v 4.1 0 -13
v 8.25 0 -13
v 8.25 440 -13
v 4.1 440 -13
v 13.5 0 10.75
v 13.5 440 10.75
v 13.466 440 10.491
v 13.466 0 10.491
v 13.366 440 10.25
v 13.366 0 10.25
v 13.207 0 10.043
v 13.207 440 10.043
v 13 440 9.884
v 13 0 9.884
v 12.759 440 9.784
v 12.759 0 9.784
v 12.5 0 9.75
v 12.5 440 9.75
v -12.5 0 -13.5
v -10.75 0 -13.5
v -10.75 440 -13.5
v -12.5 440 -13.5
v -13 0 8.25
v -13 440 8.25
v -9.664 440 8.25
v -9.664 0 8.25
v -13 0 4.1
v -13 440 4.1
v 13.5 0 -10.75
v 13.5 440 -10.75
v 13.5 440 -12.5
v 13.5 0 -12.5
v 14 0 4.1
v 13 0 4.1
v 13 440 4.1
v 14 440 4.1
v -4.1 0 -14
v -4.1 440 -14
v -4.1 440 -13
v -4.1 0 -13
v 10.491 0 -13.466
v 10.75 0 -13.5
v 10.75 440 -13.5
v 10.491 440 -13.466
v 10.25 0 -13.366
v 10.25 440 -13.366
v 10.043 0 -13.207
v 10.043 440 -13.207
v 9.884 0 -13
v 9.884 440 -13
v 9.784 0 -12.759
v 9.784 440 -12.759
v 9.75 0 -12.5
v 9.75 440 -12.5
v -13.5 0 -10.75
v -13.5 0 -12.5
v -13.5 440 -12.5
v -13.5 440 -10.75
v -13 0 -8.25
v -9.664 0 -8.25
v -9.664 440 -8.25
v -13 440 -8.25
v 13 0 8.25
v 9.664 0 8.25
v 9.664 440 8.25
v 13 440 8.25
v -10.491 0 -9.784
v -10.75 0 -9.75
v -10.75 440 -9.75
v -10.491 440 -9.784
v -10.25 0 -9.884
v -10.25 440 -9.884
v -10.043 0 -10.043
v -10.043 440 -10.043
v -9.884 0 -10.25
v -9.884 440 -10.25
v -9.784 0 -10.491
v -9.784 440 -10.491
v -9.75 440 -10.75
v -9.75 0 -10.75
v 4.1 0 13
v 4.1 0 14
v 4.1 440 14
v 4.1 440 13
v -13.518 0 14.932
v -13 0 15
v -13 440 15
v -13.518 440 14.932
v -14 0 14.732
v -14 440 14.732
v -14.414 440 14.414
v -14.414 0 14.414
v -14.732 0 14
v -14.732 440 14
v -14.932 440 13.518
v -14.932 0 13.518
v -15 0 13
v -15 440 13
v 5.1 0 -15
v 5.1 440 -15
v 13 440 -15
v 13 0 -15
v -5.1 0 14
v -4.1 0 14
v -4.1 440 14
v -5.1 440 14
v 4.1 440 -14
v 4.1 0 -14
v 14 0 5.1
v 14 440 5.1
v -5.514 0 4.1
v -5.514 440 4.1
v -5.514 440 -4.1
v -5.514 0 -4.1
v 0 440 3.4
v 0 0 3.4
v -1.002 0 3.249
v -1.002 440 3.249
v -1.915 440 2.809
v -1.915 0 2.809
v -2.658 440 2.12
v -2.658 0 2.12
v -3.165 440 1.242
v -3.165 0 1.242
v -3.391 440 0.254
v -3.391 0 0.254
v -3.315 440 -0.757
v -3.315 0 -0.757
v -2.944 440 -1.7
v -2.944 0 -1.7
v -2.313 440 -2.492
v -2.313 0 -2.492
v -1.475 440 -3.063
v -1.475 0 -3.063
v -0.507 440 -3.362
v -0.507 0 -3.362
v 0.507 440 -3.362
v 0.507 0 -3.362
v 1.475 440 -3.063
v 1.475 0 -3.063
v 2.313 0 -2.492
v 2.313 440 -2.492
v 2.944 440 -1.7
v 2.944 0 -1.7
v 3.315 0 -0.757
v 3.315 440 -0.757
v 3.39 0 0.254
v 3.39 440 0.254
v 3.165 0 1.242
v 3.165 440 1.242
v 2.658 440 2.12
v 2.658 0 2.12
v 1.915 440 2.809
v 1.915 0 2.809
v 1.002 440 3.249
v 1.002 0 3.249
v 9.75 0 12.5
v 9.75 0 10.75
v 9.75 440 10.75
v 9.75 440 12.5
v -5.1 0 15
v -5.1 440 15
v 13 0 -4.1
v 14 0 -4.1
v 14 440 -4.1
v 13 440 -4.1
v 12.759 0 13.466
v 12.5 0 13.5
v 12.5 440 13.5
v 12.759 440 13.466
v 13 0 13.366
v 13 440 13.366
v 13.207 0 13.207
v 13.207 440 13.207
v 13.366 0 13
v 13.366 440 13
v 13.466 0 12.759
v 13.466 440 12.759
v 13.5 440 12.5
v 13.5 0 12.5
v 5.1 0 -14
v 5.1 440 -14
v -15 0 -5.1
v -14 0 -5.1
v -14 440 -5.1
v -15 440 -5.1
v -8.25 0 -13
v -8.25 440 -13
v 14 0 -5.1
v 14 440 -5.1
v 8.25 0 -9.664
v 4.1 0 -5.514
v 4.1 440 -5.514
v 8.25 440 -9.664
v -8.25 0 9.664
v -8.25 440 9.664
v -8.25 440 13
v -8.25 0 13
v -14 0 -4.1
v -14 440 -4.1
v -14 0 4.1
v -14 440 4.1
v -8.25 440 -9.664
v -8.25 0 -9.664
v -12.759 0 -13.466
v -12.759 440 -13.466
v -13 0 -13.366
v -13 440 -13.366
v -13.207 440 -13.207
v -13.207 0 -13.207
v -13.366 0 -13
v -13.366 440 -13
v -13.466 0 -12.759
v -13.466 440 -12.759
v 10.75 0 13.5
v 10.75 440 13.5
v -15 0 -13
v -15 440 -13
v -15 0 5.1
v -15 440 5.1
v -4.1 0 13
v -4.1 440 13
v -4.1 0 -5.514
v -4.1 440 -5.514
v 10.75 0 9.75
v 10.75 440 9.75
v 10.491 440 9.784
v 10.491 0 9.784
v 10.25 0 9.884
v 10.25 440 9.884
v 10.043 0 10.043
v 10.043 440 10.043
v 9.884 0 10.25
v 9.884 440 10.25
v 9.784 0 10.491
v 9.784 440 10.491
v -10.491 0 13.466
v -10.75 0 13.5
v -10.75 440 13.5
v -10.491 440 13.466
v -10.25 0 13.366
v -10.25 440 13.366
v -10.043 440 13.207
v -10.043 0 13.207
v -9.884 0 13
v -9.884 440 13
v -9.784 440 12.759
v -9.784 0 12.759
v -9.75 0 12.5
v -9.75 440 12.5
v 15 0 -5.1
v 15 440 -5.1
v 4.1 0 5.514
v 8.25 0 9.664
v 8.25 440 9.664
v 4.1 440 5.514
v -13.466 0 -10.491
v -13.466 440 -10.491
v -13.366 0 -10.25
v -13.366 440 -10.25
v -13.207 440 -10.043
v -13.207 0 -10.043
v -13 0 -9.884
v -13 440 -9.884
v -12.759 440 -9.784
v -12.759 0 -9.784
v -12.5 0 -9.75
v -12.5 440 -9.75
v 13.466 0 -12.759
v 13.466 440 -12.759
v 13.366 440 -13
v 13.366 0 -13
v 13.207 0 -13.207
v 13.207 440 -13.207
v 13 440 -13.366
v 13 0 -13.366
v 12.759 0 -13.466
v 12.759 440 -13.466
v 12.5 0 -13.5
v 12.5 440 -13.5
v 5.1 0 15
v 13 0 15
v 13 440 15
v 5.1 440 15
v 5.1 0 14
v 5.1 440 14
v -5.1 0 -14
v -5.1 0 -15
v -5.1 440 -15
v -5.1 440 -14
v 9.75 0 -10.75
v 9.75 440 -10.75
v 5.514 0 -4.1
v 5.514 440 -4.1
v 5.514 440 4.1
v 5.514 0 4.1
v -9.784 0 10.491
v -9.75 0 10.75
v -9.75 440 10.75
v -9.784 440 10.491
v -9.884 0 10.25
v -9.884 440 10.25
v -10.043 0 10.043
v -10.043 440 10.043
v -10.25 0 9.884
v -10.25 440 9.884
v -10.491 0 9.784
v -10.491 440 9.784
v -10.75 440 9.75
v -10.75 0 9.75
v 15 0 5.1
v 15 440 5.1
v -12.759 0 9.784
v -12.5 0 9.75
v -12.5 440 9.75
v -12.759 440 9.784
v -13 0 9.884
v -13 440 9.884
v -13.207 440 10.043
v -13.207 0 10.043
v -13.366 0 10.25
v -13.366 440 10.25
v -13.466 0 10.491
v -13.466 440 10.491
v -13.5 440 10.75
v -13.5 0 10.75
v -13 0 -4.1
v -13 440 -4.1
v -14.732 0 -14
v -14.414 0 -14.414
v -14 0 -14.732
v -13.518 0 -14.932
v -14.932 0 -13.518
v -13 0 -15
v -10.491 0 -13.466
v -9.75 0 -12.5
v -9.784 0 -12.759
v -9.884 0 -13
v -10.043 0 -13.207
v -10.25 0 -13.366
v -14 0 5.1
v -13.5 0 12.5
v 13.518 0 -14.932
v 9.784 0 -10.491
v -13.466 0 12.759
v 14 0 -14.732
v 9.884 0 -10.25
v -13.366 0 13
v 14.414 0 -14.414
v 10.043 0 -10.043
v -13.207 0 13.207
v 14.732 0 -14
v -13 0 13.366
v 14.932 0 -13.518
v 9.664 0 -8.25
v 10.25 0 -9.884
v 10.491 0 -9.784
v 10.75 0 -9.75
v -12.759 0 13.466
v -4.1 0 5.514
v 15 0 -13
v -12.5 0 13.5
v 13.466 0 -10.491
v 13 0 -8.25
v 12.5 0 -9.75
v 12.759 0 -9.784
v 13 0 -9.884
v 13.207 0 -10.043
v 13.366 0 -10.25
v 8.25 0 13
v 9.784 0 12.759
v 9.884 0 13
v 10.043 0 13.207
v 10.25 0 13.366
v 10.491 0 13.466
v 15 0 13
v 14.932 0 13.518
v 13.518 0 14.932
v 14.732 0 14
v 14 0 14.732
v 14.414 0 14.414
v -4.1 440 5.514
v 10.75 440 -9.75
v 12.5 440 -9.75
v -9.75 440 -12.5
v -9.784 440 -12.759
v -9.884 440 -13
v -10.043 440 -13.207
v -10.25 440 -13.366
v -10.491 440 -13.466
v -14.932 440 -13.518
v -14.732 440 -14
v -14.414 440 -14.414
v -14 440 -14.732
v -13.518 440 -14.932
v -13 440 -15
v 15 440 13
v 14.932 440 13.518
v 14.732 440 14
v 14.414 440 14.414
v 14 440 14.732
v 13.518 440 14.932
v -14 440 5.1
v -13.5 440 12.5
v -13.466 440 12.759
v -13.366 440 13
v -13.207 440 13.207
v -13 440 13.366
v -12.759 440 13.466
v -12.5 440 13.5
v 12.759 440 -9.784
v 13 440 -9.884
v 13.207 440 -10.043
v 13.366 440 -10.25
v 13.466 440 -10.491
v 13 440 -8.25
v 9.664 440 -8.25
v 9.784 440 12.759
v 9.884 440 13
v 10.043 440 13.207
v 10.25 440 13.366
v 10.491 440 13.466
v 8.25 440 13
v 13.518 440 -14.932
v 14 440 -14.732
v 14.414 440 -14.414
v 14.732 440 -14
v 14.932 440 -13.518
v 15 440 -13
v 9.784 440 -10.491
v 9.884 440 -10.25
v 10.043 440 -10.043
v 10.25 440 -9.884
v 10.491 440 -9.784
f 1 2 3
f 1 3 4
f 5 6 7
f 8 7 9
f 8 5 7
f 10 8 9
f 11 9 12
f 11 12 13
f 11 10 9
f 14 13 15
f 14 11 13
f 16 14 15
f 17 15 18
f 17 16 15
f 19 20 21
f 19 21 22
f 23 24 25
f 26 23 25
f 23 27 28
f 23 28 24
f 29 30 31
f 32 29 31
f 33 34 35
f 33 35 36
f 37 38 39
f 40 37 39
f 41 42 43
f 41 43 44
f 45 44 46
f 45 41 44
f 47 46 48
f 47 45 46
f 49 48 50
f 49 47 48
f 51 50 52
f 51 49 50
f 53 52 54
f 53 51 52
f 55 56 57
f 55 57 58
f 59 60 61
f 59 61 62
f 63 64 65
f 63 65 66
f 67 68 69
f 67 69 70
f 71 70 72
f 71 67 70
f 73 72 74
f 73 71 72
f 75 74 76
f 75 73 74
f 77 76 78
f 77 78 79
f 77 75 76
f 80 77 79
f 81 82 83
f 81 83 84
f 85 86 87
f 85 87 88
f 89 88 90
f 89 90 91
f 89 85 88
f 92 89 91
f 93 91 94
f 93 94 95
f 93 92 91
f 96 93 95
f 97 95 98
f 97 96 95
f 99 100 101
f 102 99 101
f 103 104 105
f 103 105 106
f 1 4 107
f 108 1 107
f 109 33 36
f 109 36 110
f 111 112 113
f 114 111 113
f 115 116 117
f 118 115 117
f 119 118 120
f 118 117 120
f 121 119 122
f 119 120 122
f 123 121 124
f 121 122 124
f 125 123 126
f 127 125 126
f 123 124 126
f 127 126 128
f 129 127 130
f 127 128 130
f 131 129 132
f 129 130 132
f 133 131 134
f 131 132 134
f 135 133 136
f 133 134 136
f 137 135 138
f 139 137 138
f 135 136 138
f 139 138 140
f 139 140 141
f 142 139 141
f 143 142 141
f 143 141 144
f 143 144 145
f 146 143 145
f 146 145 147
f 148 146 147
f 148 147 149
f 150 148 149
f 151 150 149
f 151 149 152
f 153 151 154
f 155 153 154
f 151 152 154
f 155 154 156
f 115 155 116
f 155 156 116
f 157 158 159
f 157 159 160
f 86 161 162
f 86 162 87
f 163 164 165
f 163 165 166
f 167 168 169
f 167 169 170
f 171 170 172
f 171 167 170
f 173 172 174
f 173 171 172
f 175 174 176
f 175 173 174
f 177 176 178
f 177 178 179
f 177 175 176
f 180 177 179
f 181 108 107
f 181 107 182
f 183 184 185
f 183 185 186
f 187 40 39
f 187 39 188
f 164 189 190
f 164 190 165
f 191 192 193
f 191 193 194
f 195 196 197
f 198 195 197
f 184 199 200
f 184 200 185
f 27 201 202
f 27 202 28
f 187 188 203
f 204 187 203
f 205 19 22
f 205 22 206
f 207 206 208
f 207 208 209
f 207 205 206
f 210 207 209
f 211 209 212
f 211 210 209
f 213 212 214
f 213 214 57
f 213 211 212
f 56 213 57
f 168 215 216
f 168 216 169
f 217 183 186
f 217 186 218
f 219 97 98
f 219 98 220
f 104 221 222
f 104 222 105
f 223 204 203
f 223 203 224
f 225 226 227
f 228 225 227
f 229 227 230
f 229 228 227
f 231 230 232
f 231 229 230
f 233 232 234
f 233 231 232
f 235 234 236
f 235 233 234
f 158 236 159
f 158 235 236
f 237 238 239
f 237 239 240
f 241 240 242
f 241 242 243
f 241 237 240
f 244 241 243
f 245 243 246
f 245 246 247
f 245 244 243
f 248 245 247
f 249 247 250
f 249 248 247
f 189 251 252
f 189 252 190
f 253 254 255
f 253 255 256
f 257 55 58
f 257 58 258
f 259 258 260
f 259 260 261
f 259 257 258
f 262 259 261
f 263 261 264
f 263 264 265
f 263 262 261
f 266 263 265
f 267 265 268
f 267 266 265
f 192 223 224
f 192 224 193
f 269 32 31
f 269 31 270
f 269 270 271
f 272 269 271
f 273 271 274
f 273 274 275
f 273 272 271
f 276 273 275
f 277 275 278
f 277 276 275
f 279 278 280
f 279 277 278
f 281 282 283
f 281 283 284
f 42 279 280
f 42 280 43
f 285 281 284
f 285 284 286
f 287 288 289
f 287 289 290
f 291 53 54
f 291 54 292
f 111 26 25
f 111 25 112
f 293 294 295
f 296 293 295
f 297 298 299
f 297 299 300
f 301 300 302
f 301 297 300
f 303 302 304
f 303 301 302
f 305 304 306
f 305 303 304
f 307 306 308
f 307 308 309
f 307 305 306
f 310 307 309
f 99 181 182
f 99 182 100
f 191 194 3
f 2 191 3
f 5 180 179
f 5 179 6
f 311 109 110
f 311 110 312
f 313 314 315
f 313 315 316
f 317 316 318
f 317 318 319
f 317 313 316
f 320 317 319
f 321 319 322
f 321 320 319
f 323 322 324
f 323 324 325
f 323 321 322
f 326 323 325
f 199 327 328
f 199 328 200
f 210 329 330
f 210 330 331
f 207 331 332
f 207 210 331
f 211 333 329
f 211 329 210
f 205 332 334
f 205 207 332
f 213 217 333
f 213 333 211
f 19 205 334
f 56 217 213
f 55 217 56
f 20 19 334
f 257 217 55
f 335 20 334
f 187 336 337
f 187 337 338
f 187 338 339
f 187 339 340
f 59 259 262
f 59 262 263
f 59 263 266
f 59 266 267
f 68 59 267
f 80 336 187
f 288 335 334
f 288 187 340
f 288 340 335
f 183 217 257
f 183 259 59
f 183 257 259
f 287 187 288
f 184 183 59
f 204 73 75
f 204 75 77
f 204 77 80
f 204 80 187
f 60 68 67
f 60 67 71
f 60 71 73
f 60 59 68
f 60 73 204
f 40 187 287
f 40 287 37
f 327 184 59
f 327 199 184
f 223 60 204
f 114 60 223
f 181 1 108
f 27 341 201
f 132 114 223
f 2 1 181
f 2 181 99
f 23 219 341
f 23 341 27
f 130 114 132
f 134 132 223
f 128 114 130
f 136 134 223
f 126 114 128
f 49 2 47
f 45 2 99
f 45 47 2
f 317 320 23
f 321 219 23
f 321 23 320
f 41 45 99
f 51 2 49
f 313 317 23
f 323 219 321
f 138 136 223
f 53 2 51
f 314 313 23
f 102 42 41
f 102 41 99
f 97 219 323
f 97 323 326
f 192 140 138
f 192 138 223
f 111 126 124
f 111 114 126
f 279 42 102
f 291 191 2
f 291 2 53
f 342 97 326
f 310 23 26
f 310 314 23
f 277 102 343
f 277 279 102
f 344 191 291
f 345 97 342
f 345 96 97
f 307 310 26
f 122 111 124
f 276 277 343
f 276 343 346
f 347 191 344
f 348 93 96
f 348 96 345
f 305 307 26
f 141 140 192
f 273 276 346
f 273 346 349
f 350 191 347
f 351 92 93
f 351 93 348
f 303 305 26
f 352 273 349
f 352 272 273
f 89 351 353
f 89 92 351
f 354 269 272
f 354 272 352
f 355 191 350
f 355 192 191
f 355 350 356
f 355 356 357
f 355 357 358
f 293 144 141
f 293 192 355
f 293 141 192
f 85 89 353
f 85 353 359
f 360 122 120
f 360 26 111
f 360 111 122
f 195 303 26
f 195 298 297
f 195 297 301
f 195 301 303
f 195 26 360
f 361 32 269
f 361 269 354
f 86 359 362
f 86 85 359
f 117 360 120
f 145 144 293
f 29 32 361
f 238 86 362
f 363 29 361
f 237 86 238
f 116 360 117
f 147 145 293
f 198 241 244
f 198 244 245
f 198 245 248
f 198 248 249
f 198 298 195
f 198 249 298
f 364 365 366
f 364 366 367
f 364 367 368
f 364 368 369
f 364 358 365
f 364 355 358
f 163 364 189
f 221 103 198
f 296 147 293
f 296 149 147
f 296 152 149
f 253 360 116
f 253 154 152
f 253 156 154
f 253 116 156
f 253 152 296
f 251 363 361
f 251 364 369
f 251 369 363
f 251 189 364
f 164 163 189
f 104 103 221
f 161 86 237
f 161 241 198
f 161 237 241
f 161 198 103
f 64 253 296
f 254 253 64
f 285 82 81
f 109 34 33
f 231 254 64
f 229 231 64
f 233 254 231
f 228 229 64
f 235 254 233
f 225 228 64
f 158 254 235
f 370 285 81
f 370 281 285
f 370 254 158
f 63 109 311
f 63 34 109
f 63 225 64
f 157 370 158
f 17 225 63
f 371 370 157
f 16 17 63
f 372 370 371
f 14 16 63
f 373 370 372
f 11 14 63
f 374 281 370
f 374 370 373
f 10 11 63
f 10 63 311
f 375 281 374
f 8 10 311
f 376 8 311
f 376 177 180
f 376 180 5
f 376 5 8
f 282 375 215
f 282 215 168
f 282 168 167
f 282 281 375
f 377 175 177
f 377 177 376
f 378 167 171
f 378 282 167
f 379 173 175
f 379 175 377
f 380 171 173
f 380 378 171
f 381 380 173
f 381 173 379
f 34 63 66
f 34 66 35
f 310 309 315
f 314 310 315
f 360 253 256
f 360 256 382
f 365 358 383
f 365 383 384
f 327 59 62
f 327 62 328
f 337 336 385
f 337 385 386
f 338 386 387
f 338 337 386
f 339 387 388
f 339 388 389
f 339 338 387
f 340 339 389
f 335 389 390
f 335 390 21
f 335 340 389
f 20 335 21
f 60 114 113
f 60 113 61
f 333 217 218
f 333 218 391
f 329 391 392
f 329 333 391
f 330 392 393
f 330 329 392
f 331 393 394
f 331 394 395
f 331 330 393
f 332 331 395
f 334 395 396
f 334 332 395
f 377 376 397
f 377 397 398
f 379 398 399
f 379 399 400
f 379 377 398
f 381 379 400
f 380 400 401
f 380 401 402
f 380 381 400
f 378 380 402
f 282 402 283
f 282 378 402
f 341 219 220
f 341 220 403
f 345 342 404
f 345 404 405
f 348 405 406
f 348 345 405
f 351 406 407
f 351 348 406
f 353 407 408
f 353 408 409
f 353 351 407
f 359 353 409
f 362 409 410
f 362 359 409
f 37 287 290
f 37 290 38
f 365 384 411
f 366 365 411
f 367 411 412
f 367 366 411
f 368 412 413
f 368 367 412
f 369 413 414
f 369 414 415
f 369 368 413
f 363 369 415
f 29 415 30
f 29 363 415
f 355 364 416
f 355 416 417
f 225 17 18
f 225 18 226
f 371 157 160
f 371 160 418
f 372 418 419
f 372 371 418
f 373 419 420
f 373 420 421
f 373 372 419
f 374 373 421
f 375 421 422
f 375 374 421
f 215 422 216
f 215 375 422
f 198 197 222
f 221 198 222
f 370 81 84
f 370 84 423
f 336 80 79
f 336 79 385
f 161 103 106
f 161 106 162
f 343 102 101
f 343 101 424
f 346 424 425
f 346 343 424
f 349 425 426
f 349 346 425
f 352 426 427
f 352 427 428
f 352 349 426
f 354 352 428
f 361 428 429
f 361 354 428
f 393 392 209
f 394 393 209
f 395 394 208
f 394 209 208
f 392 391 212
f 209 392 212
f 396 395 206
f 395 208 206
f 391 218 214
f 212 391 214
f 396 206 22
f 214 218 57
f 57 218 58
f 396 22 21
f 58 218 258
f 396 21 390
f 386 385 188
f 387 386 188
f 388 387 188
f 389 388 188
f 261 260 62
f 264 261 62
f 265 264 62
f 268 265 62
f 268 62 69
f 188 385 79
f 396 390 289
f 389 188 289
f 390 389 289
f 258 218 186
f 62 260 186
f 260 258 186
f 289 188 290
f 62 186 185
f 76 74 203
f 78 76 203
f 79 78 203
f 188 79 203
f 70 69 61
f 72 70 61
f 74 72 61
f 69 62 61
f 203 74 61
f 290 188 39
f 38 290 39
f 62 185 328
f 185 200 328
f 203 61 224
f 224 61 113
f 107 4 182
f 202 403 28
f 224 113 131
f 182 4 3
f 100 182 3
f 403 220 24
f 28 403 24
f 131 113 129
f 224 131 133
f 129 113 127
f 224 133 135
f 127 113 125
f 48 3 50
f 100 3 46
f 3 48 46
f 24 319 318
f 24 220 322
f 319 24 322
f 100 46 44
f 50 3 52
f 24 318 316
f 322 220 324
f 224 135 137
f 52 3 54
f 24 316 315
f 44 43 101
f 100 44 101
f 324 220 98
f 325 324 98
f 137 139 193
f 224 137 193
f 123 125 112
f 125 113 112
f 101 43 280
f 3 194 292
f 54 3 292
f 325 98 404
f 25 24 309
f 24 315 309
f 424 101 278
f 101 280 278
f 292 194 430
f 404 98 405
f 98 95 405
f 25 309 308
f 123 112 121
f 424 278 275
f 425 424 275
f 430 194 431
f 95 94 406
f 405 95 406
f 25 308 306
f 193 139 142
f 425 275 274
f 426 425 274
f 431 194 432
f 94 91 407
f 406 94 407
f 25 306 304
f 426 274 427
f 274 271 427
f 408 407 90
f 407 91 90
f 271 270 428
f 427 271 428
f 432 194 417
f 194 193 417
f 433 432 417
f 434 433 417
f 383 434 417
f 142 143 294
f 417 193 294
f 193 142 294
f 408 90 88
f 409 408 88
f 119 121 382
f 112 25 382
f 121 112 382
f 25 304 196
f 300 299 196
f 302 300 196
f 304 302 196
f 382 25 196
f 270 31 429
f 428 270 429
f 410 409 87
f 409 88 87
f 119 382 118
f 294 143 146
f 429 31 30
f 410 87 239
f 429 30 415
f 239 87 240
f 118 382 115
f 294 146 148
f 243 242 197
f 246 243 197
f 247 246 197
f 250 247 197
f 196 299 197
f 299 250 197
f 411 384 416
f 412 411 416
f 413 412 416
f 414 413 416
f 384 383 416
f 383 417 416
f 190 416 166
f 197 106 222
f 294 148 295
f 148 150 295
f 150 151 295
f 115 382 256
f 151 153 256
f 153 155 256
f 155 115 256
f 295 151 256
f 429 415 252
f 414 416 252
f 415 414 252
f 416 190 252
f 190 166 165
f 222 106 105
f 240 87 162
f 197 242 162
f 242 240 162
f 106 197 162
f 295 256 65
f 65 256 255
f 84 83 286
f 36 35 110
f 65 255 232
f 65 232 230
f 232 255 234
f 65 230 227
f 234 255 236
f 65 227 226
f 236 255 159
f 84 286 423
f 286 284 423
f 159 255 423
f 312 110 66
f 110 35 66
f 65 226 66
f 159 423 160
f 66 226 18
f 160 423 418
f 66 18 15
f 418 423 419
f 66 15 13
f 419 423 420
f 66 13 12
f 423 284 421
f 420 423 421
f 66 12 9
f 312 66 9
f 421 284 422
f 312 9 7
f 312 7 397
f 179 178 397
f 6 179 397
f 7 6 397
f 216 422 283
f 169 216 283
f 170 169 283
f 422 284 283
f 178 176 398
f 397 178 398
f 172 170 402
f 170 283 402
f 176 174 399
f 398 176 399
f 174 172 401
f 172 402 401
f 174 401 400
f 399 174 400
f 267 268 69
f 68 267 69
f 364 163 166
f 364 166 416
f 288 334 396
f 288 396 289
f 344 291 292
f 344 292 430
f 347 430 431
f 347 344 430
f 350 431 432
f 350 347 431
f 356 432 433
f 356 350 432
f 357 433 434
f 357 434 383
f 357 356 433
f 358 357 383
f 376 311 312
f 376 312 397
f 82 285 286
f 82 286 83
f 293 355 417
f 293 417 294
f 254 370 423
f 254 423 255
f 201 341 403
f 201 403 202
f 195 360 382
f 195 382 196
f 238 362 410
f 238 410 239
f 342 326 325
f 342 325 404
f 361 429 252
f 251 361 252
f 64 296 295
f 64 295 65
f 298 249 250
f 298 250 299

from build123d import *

# Parameters (mm, degrees)
SKETCH1_R           = 3.4
BOSS_EXTRUDE1_DEPTH = 440


with BuildPart() as part:
    # Sketch1 → Boss-Extrude1 (new body)
    with BuildSketch(Plane.XZ):
        with BuildLine():
            Line((-8.24999678, 13.000000511), (-4.100001047, 13.000000511))
            Line((-4.100001047, 13.000000511), (-4.100001047, 13.9999993))
            Line((-4.100001047, 13.9999993), (-5.100001047, 13.9999993))
            Line((-5.100001047, 13.9999993), (-5.100001047, 15.000001161))
            Line((-5.100001047, 15.000001161), (-12.9999991, 15.000001161))
            ThreePointArc((-12.9999991, 15.000001161), (-14.414213082, 14.414214549), (-14.999999693, 13.000000567))
            Line((-14.999999693, 13.000000567), (-14.999999693, 5.099999792))
            Line((-14.999999693, 5.099999792), (-14.000001367, 5.099999792))
            Line((-14.000001367, 5.099999792), (-14.000001367, 4.099999792))
            Line((-14.000001367, 4.099999792), (-12.999980958, 4.099999792))
            Line((-12.999980958, 4.099999792), (-12.999980958, 8.250012005))
            Line((-12.999980958, 8.250012005), (-9.664201657, 8.250012005))
            Line((-9.664201657, 8.250012005), (-5.514202303, 4.100011174))
            Line((-5.514202303, 4.100011174), (-5.514202303, -4.099988826))
            Line((-5.514202303, -4.099988826), (-9.664194622, -8.249987936))
            Line((-9.664194622, -8.249987936), (-12.999980958, -8.249987936))
            Line((-12.999980958, -8.249987936), (-12.999980958, -4.100000208))
            Line((-12.999980958, -4.100000208), (-14.000001367, -4.100000208))
            Line((-14.000001367, -4.100000208), (-14.000001367, -5.100000208))
            Line((-14.000001367, -5.100000208), (-14.999999693, -5.100000208))
            Line((-14.999999693, -5.100000208), (-14.999999693, -13.000000955))
            ThreePointArc((-14.999999693, -13.000000955), (-14.414213128, -14.414214825), (-12.999999257, -15.000001391))
            Line((-12.999999257, -15.000001391), (-5.100001047, -15.000001391))
            Line((-5.100001047, -15.000001391), (-5.100001047, -14.000000699))
            Line((-5.100001047, -14.000000699), (-4.100001047, -14.000000699))
            Line((-4.100001047, -14.000000699), (-4.100001047, -13.000000927))
            Line((-4.100001047, -13.000000927), (-8.24999678, -13.000000927))
            Line((-8.24999678, -13.000000927), (-8.24999678, -9.664217294))
            Line((-8.24999678, -9.664217294), (-4.09999914, -5.514212907))
            Line((-4.09999914, -5.514212907), (4.100018356, -5.514212907))
            Line((4.100018356, -5.514212907), (8.250001062, -9.66419709))
            Line((8.250001062, -9.66419709), (8.250001062, -13.000000927))
            Line((8.250001062, -13.000000927), (4.099987439, -13.000000927))
            Line((4.099987439, -13.000000927), (4.099987439, -14.000000699))
            Line((4.099987439, -14.000000699), (5.099987459, -14.000000699))
            Line((5.099987459, -14.000000699), (5.099987459, -15.000001391))
            Line((5.099987459, -15.000001391), (12.999985682, -15.000001391))
            ThreePointArc((12.999985682, -15.000001391), (14.414199699, -14.414214765), (14.999986325, -13.000000748))
            Line((14.999986325, -13.000000748), (14.999986325, -5.100000208))
            Line((14.999986325, -5.100000208), (13.999990764, -5.100000208))
            Line((13.999990764, -5.100000208), (13.999990764, -4.100000208))
            Line((13.999990764, -4.100000208), (12.999996372, -4.100000208))
            Line((12.999996372, -4.100000208), (12.999996372, -8.249987936))
            Line((12.999996372, -8.249987936), (9.664201659, -8.249987936))
            Line((9.664201659, -8.249987936), (5.514206692, -4.099991492))
            Line((5.514206692, -4.099991492), (5.514206692, 4.100008559))
            Line((5.514206692, 4.100008559), (9.66420339, 8.250012005))
            Line((9.66420339, 8.250012005), (12.999996372, 8.250012005))
            Line((12.999996372, 8.250012005), (12.999996372, 4.099999792))
            Line((12.999996372, 4.099999792), (13.999990764, 4.099999792))
            Line((13.999990764, 4.099999792), (13.999990764, 5.099999792))
            Line((13.999990764, 5.099999792), (14.999986325, 5.099999792))
            Line((14.999986325, 5.099999792), (14.999986325, 13.000001058))
            ThreePointArc((14.999986325, 13.000001058), (14.414199857, 14.414214693), (12.999986222, 15.000001161))
            Line((12.999986222, 15.000001161), (5.099987459, 15.000001161))
            Line((5.099987459, 15.000001161), (5.099987459, 13.9999993))
            Line((5.099987459, 13.9999993), (4.099987439, 13.9999993))
            Line((4.099987439, 13.9999993), (4.099987439, 13.000000511))
            Line((4.099987439, 13.000000511), (8.250001062, 13.000000511))
            Line((8.250001062, 13.000000511), (8.250001062, 9.664237062))
            Line((8.250001062, 9.664237062), (4.100007893, 5.514237102))
            Line((4.100007893, 5.514237102), (-4.100018481, 5.514237102))
            Line((-4.100018481, 5.514237102), (-8.24999678, 9.664216878))
            Line((-8.24999678, 9.664216878), (-8.24999678, 13.000000511))
        make_face()
        with Locations(Location((-1.0477e-05, -4.16e-07, 0), (0, 0, 90))):
            Circle(SKETCH1_R, mode=Mode.SUBTRACT)
        with BuildLine():
            Line((13.499986967, -10.750000579), (13.499986967, -12.500001267))
            ThreePointArc((13.499986967, -12.500001267), (13.207093572, -13.207108473), (12.499986367, -13.500001867))
            Line((12.499986367, -13.500001867), (10.749986886, -13.500001867))
            ThreePointArc((10.749986886, -13.500001867), (10.042879512, -13.207108403), (9.749986047, -12.500001028))
            Line((9.749986047, -12.500001028), (9.749986047, -10.750001028))
            ThreePointArc((9.749986047, -10.750001028), (10.042879305, -10.042894153), (10.74998618, -9.750000895))
            Line((10.74998618, -9.750000895), (12.499987283, -9.750000895))
            ThreePointArc((12.499987283, -9.750000895), (13.207093841, -10.042894021), (13.499986967, -10.750000579))
        make_face(mode=Mode.SUBTRACT)
        with BuildLine():
            Line((-10.749994869, 9.750000545), (-12.499998542, 9.750000545))
            ThreePointArc((-12.499998542, 9.750000545), (-13.207105378, 10.042893787), (-13.499998619, 10.750000623))
            Line((-13.499998619, 10.750000623), (-13.499998619, 12.500000623))
            ThreePointArc((-13.499998619, 12.500000623), (-13.207105152, 13.207108005), (-12.499997769, 13.500001473))
            Line((-12.499997769, 13.500001473), (-10.749995653, 13.500001473))
            ThreePointArc((-10.749995653, 13.500001473), (-10.04288827, 13.207108005), (-9.749994803, 12.500000623))
            Line((-9.749994803, 12.500000623), (-9.749994803, 10.750000612))
            ThreePointArc((-9.749994803, 10.750000612), (-10.042888041, 10.042893784), (-10.749994869, 9.750000545))
        make_face(mode=Mode.SUBTRACT)
        with BuildLine():
            Line((12.499988487, 9.750000545), (10.74998617, 9.750000545))
            ThreePointArc((10.74998617, 9.750000545), (10.042879302, 10.0428938), (9.749986047, 10.750000668))
            Line((9.749986047, 10.750000668), (9.749986047, 12.500000634))
            ThreePointArc((9.749986047, 12.500000634), (10.042879552, 13.207108106), (10.749987025, 13.500001611))
            Line((10.749987025, 13.500001611), (12.499987646, 13.500001611))
            ThreePointArc((12.499987646, 13.500001611), (13.207095116, 13.207108107), (13.49998862, 12.500000637))
            Line((13.49998862, 12.500000637), (13.49998862, 10.750000679))
            ThreePointArc((13.49998862, 10.750000679), (13.207095362, 10.042893803), (12.499988487, 9.750000545))
        make_face(mode=Mode.SUBTRACT)
        with BuildLine():
            Line((-10.749995791, -13.500002028), (-12.499997631, -13.500002028))
            ThreePointArc((-12.499997631, -13.500002028), (-13.207105111, -13.207108519), (-13.499998619, -12.500001039))
            Line((-13.499998619, -12.500001039), (-13.499998619, -10.750001039))
            ThreePointArc((-13.499998619, -10.750001039), (-13.207105358, -10.042894156), (-12.499998475, -9.750000895))
            Line((-12.499998475, -9.750000895), (-10.749994936, -9.750000895))
            ThreePointArc((-10.749994936, -9.750000895), (-10.042888061, -10.042894153), (-9.749994803, -10.750001028))
            Line((-9.749994803, -10.750001028), (-9.749994803, -12.500001039))
            ThreePointArc((-9.749994803, -12.500001039), (-10.042888311, -13.207108519), (-10.749995791, -13.500002028))
        make_face(mode=Mode.SUBTRACT)
    extrude(amount=-BOSS_EXTRUDE1_DEPTH)


solid = part.part
